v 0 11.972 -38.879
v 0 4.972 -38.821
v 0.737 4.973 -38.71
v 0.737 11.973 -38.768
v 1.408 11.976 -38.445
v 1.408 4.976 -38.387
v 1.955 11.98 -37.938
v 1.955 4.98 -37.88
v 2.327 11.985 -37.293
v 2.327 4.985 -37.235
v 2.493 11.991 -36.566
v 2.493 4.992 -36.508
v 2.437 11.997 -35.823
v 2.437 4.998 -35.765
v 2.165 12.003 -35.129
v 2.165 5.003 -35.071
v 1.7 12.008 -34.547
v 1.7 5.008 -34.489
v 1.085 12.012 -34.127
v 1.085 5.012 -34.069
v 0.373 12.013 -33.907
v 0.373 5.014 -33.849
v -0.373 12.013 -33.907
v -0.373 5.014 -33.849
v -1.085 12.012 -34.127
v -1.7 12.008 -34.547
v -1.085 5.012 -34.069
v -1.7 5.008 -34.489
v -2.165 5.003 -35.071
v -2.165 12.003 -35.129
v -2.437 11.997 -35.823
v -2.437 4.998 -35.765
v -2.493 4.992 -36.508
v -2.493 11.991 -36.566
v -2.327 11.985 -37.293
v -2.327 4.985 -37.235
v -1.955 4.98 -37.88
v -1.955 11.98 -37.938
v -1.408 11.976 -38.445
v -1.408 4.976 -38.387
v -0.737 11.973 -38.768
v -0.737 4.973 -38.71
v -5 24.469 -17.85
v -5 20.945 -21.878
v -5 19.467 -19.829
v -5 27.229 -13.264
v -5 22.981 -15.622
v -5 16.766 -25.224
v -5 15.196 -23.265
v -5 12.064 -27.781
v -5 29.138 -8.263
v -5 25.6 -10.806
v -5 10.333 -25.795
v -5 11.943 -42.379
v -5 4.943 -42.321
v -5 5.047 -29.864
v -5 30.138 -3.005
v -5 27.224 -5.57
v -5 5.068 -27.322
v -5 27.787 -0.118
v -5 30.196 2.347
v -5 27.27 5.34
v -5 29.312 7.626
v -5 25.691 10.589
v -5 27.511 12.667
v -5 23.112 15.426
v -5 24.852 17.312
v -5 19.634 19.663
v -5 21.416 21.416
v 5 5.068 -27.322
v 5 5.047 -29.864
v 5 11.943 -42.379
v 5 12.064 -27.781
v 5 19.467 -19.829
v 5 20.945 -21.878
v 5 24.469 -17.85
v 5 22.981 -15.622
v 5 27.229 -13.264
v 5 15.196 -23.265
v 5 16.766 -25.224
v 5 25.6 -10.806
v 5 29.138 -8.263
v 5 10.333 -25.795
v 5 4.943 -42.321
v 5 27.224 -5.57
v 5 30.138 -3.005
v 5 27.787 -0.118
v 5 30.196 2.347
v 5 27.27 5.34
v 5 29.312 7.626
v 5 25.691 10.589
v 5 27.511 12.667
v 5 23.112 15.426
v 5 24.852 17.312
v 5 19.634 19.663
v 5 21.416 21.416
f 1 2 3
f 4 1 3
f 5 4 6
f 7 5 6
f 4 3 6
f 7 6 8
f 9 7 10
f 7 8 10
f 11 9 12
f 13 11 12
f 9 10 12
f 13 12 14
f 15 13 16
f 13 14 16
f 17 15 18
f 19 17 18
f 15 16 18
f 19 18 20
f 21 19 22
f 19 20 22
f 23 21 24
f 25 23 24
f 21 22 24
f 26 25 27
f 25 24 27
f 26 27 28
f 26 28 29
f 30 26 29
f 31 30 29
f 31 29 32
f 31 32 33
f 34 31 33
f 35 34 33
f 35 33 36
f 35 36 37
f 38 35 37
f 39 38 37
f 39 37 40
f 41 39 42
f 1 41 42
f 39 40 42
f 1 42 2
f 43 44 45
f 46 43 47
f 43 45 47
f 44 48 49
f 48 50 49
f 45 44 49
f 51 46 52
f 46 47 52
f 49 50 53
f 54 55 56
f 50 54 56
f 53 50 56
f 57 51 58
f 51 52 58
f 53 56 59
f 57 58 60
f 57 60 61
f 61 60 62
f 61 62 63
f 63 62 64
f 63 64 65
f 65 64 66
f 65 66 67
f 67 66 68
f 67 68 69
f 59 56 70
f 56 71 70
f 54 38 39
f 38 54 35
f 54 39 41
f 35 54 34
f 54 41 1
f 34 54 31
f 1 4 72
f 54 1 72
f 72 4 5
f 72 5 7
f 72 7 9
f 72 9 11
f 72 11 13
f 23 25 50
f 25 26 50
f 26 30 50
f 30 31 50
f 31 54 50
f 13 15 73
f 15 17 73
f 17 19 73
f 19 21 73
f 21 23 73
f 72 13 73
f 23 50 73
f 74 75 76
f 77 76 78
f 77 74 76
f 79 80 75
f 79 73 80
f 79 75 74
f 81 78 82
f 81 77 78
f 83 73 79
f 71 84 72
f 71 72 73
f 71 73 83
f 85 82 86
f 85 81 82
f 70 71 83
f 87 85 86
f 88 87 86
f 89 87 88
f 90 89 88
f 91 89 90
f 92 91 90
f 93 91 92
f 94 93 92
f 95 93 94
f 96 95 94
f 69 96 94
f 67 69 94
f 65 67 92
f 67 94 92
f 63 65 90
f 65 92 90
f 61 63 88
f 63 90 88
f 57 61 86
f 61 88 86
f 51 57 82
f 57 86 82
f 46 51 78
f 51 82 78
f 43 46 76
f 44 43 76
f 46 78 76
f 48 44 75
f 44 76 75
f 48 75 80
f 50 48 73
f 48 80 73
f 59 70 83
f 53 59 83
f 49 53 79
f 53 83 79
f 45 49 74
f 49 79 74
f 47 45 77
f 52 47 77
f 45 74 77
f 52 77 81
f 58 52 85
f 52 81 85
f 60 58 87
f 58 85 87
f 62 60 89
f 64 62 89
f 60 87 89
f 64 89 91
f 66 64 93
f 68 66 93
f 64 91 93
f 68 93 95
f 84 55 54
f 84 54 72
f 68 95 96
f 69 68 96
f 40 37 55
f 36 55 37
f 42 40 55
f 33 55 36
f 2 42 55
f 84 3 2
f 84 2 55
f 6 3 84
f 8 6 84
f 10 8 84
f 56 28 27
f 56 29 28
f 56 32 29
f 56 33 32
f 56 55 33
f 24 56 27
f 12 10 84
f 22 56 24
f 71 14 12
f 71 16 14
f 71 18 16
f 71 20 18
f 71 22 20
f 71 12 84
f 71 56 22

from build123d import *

# Parameters (mm, degrees)
BOSS_EXTRUDE1_DEPTH = 5
SKETCH6_W           = 10
SKETCH6_H           = 15
SKETCH6_R           = 2.5
BOSS_EXTRUDE2_DEPTH = 7


with BuildPart() as part:
    # Sketch5 → Boss-Extrude1 (new, symmetric)
    with BuildSketch(Plane(origin=(0, 0, 0), x_dir=(0, 0, -1), z_dir=(1, 0, 0))):
        with BuildLine():
            Line((-19.663469321, 19.634120506), (-21.416496635, 21.416496635))
            ThreePointArc((-21.416496635, 21.416496635), (9.210493666, 28.853066781), (29.864087216, 5.046677222))
            Line((29.864087216, 5.046677222), (27.321571741, 5.067783672))
            ThreePointArc((27.321571741, 5.067783672), (8.228376229, 26.541374087), (-19.663469321, 19.634120506))
        make_face()
    extrude(amount=BOSS_EXTRUDE1_DEPTH, both=True)

    # Sketch6 → Boss-Extrude2 (add)
    with BuildSketch(Plane(origin=(0, 5.294226257, -0.043949516), x_dir=(1, 0, 0), z_dir=(0, -0.9999655451195217, 0.008301118829285392))):
        with Locations((0, -34.778562105)):
            Rectangle(SKETCH6_W, SKETCH6_H)
        with Locations(Location((0, -36.278562105, 0), (0, 0, 270))):
            Circle(SKETCH6_R, mode=Mode.SUBTRACT)
    extrude(amount=-BOSS_EXTRUDE2_DEPTH)


solid = part.part
